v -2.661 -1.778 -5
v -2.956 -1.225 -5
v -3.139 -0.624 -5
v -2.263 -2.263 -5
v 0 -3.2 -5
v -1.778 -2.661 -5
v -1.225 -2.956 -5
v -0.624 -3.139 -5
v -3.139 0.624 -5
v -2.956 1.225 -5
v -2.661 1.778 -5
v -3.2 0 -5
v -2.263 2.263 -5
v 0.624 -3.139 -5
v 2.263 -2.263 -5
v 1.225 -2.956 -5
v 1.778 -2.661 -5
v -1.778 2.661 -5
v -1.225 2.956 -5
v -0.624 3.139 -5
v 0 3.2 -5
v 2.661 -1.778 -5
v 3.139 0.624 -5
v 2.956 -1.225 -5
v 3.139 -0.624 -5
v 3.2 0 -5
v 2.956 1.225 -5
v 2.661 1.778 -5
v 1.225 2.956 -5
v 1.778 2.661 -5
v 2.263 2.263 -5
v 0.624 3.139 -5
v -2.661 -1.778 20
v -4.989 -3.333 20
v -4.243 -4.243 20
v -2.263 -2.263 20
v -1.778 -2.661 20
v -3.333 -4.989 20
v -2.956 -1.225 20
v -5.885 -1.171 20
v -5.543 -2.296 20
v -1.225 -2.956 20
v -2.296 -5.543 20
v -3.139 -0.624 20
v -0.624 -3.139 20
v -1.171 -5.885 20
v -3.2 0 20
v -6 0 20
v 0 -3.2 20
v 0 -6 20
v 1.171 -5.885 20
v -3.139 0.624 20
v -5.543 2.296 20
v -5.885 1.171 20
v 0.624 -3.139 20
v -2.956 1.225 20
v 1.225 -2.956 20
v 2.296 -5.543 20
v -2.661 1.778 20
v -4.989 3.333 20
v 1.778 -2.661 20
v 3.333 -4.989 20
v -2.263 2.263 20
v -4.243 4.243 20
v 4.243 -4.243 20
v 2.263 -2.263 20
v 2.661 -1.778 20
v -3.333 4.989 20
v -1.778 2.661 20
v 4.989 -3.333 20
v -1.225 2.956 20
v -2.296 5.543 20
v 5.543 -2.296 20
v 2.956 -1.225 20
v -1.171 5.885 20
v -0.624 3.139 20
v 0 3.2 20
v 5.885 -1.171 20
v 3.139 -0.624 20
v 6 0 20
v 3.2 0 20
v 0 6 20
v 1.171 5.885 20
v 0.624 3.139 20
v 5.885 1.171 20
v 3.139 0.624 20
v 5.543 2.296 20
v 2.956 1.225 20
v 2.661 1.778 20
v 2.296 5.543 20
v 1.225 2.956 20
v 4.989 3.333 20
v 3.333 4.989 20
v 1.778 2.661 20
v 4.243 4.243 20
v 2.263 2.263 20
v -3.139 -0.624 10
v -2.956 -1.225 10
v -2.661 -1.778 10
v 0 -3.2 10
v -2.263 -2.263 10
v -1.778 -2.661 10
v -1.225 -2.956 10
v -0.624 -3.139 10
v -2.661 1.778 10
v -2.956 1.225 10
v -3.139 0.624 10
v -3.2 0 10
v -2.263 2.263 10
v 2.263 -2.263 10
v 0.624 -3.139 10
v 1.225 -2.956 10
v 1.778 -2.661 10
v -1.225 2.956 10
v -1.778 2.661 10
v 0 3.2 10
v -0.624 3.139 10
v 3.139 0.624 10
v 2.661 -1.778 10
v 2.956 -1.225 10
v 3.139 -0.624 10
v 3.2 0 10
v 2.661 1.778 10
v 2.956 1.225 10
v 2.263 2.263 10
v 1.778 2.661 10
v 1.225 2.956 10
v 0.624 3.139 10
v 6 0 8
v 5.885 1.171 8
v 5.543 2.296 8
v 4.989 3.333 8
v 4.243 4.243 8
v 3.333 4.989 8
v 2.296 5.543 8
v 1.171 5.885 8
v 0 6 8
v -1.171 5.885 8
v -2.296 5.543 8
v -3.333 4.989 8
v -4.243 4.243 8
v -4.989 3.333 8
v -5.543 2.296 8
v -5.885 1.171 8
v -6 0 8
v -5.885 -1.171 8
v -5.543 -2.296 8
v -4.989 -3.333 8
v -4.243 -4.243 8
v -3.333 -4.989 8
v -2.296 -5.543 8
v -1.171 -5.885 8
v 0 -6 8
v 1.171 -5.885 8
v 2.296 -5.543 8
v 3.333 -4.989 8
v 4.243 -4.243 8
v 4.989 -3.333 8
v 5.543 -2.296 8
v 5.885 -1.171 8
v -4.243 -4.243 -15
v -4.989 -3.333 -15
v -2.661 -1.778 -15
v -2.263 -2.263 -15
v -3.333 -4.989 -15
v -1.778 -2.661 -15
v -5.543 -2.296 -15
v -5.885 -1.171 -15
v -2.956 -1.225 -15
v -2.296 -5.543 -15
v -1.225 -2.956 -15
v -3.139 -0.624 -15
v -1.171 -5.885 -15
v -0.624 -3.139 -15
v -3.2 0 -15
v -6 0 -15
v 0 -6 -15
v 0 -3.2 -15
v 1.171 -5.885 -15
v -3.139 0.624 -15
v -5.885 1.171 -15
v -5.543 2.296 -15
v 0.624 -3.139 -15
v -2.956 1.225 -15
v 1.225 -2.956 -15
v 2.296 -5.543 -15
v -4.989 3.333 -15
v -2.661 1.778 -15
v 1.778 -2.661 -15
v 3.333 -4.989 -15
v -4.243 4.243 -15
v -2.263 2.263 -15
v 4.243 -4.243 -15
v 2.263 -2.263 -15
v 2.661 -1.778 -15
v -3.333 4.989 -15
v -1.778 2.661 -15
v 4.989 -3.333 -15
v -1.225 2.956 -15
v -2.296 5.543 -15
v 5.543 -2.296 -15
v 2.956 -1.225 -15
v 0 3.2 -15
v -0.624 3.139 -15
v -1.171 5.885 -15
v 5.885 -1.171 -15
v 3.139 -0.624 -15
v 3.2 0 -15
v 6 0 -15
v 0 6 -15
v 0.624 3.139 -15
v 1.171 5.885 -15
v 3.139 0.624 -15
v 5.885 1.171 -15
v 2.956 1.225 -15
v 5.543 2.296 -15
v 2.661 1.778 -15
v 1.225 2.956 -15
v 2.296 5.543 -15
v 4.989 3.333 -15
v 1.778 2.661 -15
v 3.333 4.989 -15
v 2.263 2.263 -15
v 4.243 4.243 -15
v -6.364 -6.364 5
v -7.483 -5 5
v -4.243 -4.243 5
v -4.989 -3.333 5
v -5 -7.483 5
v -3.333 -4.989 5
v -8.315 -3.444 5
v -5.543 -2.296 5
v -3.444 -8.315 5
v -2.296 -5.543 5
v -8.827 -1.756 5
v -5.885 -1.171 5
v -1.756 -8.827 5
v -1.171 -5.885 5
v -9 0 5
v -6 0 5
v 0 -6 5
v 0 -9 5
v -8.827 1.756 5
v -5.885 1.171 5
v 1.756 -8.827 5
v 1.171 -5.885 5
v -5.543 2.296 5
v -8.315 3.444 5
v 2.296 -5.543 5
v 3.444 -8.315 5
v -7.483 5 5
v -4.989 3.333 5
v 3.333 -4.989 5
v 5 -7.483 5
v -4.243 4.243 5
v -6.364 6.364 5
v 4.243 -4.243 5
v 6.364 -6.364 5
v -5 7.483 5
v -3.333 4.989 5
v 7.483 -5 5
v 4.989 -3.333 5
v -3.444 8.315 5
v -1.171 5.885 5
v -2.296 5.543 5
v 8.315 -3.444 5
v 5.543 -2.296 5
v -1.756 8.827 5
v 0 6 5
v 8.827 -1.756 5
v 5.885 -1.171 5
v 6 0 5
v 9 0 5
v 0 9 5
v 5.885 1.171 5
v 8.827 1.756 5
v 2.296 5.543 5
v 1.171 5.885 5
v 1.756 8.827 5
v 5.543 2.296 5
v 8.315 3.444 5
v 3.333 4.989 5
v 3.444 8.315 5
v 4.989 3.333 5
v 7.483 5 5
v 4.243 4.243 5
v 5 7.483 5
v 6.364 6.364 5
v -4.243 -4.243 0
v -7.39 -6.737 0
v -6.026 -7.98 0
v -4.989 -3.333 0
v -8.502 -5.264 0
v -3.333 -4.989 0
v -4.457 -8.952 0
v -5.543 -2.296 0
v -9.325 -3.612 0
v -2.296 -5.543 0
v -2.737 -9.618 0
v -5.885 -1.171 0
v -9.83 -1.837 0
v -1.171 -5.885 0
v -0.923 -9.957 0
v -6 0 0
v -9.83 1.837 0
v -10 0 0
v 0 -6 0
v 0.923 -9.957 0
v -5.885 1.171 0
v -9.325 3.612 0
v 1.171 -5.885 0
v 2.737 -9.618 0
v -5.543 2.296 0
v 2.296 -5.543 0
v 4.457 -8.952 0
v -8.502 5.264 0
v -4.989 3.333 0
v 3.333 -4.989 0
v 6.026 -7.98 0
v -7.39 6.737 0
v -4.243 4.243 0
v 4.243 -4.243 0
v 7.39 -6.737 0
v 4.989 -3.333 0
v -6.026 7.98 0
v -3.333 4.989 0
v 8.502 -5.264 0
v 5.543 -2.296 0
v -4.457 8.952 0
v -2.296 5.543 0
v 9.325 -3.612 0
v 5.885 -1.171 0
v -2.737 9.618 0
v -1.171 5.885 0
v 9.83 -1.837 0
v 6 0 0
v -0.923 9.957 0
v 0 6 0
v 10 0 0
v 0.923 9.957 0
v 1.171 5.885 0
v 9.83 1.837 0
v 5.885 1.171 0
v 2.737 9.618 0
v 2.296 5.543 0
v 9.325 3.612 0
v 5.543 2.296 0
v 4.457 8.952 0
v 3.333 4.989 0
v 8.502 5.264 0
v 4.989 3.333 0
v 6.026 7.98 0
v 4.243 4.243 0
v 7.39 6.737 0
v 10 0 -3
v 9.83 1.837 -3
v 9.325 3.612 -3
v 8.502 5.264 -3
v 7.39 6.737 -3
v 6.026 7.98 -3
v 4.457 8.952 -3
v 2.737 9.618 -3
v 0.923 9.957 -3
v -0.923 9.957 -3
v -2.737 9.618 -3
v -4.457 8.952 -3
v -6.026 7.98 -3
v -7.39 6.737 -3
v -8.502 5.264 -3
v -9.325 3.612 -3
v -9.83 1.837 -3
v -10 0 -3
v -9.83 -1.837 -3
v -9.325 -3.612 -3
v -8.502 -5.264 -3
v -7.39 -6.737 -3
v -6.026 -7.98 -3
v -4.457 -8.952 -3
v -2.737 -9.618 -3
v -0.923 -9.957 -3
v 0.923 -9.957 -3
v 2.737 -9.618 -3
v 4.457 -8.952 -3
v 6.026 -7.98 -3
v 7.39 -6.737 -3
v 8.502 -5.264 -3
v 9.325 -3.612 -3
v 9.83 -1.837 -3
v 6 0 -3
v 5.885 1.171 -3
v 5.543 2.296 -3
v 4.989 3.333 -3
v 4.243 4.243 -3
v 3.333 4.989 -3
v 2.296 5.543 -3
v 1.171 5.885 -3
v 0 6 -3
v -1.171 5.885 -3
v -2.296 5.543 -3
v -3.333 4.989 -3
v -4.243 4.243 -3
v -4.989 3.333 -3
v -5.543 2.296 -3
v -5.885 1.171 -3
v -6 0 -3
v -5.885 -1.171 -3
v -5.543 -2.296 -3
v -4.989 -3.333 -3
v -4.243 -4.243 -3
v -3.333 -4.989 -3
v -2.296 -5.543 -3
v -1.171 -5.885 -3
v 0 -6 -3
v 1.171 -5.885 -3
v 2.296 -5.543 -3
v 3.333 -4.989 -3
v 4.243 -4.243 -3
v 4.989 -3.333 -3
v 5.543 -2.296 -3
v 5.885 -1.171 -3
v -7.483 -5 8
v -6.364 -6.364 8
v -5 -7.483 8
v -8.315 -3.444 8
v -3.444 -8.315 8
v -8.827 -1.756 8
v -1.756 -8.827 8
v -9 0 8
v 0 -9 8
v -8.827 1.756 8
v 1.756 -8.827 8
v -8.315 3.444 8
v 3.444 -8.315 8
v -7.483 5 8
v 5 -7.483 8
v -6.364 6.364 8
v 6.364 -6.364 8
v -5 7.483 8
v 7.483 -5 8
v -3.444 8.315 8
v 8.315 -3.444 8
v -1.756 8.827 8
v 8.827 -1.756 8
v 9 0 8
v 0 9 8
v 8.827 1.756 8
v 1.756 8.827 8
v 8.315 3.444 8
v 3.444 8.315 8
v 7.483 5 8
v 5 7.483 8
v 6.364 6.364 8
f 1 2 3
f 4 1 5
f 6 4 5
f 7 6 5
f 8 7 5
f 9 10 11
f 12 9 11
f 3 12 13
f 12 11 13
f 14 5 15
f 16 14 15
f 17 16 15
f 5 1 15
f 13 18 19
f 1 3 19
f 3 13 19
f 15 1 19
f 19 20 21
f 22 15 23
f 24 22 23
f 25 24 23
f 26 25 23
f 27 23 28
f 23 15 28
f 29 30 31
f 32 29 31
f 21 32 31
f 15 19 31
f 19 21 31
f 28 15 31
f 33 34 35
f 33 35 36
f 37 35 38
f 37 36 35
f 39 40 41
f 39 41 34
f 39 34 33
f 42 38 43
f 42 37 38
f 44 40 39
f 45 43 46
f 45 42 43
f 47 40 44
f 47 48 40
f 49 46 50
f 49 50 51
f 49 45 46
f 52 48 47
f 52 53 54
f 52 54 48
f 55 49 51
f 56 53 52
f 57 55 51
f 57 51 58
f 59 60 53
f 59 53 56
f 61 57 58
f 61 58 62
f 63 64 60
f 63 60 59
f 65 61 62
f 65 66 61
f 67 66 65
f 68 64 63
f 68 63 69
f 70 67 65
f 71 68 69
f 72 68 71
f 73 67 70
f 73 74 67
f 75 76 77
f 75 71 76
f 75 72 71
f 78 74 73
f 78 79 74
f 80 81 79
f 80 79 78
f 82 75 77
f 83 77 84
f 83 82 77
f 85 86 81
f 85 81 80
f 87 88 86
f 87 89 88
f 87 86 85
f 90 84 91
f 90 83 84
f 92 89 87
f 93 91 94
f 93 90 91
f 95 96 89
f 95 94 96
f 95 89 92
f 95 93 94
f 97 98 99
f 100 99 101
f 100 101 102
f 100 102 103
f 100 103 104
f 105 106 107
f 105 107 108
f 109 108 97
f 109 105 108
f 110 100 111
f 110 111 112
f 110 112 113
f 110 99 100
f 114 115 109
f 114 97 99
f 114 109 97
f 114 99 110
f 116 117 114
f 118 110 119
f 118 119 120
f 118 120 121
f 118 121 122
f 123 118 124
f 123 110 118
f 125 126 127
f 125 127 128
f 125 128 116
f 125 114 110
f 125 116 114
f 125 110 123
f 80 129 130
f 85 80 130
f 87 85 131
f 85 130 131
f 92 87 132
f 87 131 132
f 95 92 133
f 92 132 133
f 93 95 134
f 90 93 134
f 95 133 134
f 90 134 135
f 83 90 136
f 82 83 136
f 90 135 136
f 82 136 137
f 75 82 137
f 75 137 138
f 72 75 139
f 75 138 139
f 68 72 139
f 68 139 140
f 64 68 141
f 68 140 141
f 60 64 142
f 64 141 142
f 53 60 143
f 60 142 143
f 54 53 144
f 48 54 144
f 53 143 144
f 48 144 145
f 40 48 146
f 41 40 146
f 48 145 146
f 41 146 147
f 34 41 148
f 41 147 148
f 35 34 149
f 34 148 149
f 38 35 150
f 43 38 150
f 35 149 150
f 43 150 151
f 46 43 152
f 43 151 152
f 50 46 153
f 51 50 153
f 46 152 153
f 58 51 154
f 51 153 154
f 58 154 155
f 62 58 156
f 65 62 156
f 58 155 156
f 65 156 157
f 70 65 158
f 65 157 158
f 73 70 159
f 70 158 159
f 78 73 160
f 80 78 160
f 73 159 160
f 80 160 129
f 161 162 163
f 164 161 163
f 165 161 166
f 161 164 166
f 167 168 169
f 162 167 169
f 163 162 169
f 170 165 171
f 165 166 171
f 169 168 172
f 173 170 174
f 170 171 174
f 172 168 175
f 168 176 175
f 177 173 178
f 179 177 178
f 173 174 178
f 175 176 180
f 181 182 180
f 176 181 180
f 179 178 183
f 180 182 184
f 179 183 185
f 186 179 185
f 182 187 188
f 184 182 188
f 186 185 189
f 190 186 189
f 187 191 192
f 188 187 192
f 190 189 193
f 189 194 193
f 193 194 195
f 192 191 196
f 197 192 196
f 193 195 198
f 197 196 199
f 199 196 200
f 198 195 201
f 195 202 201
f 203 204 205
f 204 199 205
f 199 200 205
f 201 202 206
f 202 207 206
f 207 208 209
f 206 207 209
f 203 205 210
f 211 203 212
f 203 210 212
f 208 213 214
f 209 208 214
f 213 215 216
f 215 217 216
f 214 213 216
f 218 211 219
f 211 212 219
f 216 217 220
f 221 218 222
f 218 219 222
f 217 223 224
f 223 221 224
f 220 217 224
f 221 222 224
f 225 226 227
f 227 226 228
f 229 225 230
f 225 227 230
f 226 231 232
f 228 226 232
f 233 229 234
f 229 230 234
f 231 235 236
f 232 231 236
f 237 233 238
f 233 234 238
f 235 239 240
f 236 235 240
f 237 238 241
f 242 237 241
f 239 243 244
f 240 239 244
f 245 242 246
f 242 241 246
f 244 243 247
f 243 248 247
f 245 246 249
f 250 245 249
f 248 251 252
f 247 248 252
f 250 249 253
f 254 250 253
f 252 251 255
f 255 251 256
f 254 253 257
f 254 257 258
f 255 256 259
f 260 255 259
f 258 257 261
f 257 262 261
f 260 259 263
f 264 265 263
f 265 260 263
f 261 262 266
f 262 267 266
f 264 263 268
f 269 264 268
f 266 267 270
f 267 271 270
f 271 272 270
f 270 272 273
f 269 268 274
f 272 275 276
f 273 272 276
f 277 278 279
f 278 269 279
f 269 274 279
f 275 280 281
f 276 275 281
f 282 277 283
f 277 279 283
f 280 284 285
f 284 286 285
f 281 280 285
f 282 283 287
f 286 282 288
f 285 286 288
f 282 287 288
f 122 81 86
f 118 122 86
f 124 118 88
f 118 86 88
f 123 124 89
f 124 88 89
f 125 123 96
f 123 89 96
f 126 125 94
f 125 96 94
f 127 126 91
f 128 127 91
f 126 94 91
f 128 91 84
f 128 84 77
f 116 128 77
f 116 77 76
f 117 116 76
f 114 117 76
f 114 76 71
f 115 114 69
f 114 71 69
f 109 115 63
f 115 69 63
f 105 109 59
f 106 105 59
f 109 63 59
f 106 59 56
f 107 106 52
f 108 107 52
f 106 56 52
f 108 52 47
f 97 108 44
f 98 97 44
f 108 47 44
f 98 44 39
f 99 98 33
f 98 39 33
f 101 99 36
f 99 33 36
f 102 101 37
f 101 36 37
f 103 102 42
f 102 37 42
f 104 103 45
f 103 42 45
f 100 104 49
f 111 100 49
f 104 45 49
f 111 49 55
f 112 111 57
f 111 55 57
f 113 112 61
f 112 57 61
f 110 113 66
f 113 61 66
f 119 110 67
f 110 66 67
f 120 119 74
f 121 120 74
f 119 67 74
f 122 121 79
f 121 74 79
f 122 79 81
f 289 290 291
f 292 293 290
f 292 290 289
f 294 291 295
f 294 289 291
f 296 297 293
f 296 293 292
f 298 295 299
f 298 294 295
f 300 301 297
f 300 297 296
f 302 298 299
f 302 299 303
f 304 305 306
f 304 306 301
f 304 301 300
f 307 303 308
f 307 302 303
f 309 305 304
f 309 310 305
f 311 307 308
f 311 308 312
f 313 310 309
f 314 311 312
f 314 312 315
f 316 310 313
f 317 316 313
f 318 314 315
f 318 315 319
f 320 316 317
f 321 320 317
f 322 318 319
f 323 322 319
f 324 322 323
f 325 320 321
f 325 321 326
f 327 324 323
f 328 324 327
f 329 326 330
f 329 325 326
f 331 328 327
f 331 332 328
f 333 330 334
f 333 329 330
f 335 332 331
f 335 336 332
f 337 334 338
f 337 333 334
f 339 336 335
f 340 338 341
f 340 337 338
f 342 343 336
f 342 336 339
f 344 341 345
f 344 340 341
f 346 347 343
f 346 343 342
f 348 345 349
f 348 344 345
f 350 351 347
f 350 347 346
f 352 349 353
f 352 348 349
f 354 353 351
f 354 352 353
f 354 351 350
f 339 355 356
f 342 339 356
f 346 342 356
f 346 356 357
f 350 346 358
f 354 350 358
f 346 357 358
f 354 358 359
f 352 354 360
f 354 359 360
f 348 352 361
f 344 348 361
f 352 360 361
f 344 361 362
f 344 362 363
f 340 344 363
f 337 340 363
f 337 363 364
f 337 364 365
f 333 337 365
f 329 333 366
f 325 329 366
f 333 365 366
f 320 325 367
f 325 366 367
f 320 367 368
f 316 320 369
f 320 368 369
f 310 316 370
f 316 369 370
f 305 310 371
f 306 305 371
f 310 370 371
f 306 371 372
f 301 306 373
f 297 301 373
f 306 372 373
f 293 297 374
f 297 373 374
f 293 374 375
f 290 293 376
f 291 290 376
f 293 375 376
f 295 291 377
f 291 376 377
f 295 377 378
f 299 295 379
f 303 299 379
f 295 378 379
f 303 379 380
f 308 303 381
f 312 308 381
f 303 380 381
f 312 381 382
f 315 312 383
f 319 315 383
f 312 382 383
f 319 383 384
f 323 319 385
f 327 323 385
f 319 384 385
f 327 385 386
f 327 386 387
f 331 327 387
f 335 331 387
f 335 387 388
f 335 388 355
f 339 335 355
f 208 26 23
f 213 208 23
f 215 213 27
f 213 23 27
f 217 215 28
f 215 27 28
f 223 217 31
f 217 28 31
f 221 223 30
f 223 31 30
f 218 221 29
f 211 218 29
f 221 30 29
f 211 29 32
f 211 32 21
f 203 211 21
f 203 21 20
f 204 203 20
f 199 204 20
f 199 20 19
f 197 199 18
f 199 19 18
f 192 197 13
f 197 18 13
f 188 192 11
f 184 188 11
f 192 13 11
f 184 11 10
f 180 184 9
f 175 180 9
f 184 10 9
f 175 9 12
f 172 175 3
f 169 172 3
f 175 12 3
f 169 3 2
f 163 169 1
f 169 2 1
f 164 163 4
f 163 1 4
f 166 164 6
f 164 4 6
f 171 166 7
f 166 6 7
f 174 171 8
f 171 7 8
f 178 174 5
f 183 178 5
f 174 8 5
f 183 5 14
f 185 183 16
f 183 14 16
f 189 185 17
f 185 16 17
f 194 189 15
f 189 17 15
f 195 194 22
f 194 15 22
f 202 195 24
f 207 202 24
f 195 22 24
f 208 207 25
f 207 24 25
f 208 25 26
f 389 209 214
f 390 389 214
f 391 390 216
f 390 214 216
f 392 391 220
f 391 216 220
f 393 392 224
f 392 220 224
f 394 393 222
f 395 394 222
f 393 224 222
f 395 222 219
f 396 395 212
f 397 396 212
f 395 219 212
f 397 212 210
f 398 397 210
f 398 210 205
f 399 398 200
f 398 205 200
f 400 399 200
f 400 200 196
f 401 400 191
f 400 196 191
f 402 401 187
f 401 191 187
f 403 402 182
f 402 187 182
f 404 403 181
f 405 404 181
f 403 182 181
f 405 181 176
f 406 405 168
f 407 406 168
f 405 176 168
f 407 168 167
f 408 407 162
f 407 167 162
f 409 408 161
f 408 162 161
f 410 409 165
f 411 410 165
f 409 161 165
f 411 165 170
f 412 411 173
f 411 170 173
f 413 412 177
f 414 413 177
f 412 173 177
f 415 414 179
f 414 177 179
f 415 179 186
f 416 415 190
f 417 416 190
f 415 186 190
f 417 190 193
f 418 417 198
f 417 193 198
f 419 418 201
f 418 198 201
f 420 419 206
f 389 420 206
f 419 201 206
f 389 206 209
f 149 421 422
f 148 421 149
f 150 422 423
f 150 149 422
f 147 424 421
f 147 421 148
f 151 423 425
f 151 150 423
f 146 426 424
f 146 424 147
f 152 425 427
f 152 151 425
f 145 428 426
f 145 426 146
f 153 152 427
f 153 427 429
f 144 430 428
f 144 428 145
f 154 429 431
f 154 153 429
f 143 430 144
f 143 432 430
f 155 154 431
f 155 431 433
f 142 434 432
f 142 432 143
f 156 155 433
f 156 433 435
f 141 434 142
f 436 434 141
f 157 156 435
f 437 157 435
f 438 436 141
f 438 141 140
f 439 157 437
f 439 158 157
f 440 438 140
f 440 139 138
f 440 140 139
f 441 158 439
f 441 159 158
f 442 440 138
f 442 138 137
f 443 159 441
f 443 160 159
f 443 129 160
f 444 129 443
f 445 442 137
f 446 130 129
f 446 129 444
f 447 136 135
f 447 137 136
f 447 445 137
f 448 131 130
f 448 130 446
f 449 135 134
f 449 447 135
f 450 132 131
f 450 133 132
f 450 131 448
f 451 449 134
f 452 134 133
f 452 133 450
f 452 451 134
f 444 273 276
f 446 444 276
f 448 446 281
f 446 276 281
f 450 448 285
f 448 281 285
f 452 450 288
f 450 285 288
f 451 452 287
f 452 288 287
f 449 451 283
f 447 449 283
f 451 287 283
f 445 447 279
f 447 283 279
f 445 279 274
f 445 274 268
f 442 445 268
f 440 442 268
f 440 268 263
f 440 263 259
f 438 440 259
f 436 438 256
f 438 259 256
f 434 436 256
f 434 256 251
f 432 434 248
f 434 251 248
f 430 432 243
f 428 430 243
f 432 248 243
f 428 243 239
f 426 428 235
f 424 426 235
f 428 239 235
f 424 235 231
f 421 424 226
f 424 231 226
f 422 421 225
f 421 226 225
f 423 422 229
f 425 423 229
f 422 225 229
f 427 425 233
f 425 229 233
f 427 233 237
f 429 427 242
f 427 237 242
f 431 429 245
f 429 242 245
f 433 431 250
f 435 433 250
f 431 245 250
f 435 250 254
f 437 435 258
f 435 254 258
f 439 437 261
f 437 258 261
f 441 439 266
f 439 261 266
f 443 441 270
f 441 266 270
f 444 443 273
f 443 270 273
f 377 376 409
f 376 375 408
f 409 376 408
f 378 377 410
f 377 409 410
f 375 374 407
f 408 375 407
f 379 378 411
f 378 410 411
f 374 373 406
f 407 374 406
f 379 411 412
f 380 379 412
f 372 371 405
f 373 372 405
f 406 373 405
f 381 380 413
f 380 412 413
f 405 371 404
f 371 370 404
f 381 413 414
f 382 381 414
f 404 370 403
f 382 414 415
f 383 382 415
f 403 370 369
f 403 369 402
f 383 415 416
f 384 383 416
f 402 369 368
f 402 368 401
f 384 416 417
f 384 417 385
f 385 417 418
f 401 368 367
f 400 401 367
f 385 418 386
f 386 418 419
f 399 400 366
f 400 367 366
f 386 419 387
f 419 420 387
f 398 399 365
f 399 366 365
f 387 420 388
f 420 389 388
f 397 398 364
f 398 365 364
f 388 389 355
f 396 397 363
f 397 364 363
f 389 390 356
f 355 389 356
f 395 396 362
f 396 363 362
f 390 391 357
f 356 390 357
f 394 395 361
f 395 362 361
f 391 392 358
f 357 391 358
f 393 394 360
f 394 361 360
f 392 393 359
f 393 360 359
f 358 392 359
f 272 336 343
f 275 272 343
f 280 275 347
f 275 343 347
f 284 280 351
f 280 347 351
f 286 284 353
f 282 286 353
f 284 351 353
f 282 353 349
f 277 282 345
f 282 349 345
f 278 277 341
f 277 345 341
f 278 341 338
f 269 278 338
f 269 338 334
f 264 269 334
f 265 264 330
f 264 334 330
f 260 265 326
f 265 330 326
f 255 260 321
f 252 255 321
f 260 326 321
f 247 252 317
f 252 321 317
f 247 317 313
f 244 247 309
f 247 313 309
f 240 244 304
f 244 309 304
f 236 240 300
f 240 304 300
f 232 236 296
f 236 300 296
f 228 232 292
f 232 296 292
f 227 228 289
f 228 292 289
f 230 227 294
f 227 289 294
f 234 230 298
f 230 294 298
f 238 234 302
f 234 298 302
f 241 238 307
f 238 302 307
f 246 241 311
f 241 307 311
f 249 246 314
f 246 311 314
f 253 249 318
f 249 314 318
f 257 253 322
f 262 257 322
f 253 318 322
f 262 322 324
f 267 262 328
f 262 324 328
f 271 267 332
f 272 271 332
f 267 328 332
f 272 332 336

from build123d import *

# Parameters (mm, degrees)
REAR_FLANGE_START    = -3
SKETCH1_R            = 10
REAR_FLANGE_DEPTH    = 3
SKETCH2_R            = 6
THROUGH_BODY_DEPTH   = 5
LOCK_NUT_START       = 5
SKETCH3_R            = 9
LOCK_NUT_DEPTH       = 3
INSIDE_PORT_START    = 8
SKETCH4_R            = 6
INSIDE_PORT_DEPTH    = 12
INSIDE_SOCKET_START  = 20
SKETCH5_R            = 3.2
INSIDE_SOCKET_DEPTH  = 10
OUTSIDE_PORT_START   = -15
SKETCH6_R            = 6
OUTSIDE_PORT_DEPTH   = 12
OUTSIDE_SOCKET_START = -5
SKETCH7_R            = 3.2
OUTSIDE_SOCKET_DEPTH = 10


with BuildPart() as part:
    # Sketch1 → Rear_Flange (new body)
    with BuildSketch(Plane.XY.offset(REAR_FLANGE_START)):
        Circle(SKETCH1_R)
    extrude(amount=REAR_FLANGE_DEPTH)

    # Sketch2 → Through_Body (add)
    with BuildSketch(Plane.XY):
        Circle(SKETCH2_R)
    extrude(amount=THROUGH_BODY_DEPTH)

    # Sketch3 → Lock_Nut (add)
    with BuildSketch(Plane.XY.offset(LOCK_NUT_START)):
        Circle(SKETCH3_R)
    extrude(amount=LOCK_NUT_DEPTH)

    # Sketch4 → Inside_Port (add)
    with BuildSketch(Plane.XY.offset(INSIDE_PORT_START)):
        Circle(SKETCH4_R)
    extrude(amount=INSIDE_PORT_DEPTH)

    # Sketch5 → Inside_Socket (cut)
    with BuildSketch(Plane.XY.offset(INSIDE_SOCKET_START)):
        Circle(SKETCH5_R)
    extrude(amount=-INSIDE_SOCKET_DEPTH, mode=Mode.SUBTRACT)

    # Sketch6 → Outside_Port (add)
    with BuildSketch(Plane.XY.offset(OUTSIDE_PORT_START)):
        Circle(SKETCH6_R)
    extrude(amount=OUTSIDE_PORT_DEPTH)

    # Sketch7 → Outside_Socket (cut)
    with BuildSketch(Plane.XY.offset(OUTSIDE_SOCKET_START)):
        Circle(SKETCH7_R)
    extrude(amount=-OUTSIDE_SOCKET_DEPTH, mode=Mode.SUBTRACT)


solid = part.part
